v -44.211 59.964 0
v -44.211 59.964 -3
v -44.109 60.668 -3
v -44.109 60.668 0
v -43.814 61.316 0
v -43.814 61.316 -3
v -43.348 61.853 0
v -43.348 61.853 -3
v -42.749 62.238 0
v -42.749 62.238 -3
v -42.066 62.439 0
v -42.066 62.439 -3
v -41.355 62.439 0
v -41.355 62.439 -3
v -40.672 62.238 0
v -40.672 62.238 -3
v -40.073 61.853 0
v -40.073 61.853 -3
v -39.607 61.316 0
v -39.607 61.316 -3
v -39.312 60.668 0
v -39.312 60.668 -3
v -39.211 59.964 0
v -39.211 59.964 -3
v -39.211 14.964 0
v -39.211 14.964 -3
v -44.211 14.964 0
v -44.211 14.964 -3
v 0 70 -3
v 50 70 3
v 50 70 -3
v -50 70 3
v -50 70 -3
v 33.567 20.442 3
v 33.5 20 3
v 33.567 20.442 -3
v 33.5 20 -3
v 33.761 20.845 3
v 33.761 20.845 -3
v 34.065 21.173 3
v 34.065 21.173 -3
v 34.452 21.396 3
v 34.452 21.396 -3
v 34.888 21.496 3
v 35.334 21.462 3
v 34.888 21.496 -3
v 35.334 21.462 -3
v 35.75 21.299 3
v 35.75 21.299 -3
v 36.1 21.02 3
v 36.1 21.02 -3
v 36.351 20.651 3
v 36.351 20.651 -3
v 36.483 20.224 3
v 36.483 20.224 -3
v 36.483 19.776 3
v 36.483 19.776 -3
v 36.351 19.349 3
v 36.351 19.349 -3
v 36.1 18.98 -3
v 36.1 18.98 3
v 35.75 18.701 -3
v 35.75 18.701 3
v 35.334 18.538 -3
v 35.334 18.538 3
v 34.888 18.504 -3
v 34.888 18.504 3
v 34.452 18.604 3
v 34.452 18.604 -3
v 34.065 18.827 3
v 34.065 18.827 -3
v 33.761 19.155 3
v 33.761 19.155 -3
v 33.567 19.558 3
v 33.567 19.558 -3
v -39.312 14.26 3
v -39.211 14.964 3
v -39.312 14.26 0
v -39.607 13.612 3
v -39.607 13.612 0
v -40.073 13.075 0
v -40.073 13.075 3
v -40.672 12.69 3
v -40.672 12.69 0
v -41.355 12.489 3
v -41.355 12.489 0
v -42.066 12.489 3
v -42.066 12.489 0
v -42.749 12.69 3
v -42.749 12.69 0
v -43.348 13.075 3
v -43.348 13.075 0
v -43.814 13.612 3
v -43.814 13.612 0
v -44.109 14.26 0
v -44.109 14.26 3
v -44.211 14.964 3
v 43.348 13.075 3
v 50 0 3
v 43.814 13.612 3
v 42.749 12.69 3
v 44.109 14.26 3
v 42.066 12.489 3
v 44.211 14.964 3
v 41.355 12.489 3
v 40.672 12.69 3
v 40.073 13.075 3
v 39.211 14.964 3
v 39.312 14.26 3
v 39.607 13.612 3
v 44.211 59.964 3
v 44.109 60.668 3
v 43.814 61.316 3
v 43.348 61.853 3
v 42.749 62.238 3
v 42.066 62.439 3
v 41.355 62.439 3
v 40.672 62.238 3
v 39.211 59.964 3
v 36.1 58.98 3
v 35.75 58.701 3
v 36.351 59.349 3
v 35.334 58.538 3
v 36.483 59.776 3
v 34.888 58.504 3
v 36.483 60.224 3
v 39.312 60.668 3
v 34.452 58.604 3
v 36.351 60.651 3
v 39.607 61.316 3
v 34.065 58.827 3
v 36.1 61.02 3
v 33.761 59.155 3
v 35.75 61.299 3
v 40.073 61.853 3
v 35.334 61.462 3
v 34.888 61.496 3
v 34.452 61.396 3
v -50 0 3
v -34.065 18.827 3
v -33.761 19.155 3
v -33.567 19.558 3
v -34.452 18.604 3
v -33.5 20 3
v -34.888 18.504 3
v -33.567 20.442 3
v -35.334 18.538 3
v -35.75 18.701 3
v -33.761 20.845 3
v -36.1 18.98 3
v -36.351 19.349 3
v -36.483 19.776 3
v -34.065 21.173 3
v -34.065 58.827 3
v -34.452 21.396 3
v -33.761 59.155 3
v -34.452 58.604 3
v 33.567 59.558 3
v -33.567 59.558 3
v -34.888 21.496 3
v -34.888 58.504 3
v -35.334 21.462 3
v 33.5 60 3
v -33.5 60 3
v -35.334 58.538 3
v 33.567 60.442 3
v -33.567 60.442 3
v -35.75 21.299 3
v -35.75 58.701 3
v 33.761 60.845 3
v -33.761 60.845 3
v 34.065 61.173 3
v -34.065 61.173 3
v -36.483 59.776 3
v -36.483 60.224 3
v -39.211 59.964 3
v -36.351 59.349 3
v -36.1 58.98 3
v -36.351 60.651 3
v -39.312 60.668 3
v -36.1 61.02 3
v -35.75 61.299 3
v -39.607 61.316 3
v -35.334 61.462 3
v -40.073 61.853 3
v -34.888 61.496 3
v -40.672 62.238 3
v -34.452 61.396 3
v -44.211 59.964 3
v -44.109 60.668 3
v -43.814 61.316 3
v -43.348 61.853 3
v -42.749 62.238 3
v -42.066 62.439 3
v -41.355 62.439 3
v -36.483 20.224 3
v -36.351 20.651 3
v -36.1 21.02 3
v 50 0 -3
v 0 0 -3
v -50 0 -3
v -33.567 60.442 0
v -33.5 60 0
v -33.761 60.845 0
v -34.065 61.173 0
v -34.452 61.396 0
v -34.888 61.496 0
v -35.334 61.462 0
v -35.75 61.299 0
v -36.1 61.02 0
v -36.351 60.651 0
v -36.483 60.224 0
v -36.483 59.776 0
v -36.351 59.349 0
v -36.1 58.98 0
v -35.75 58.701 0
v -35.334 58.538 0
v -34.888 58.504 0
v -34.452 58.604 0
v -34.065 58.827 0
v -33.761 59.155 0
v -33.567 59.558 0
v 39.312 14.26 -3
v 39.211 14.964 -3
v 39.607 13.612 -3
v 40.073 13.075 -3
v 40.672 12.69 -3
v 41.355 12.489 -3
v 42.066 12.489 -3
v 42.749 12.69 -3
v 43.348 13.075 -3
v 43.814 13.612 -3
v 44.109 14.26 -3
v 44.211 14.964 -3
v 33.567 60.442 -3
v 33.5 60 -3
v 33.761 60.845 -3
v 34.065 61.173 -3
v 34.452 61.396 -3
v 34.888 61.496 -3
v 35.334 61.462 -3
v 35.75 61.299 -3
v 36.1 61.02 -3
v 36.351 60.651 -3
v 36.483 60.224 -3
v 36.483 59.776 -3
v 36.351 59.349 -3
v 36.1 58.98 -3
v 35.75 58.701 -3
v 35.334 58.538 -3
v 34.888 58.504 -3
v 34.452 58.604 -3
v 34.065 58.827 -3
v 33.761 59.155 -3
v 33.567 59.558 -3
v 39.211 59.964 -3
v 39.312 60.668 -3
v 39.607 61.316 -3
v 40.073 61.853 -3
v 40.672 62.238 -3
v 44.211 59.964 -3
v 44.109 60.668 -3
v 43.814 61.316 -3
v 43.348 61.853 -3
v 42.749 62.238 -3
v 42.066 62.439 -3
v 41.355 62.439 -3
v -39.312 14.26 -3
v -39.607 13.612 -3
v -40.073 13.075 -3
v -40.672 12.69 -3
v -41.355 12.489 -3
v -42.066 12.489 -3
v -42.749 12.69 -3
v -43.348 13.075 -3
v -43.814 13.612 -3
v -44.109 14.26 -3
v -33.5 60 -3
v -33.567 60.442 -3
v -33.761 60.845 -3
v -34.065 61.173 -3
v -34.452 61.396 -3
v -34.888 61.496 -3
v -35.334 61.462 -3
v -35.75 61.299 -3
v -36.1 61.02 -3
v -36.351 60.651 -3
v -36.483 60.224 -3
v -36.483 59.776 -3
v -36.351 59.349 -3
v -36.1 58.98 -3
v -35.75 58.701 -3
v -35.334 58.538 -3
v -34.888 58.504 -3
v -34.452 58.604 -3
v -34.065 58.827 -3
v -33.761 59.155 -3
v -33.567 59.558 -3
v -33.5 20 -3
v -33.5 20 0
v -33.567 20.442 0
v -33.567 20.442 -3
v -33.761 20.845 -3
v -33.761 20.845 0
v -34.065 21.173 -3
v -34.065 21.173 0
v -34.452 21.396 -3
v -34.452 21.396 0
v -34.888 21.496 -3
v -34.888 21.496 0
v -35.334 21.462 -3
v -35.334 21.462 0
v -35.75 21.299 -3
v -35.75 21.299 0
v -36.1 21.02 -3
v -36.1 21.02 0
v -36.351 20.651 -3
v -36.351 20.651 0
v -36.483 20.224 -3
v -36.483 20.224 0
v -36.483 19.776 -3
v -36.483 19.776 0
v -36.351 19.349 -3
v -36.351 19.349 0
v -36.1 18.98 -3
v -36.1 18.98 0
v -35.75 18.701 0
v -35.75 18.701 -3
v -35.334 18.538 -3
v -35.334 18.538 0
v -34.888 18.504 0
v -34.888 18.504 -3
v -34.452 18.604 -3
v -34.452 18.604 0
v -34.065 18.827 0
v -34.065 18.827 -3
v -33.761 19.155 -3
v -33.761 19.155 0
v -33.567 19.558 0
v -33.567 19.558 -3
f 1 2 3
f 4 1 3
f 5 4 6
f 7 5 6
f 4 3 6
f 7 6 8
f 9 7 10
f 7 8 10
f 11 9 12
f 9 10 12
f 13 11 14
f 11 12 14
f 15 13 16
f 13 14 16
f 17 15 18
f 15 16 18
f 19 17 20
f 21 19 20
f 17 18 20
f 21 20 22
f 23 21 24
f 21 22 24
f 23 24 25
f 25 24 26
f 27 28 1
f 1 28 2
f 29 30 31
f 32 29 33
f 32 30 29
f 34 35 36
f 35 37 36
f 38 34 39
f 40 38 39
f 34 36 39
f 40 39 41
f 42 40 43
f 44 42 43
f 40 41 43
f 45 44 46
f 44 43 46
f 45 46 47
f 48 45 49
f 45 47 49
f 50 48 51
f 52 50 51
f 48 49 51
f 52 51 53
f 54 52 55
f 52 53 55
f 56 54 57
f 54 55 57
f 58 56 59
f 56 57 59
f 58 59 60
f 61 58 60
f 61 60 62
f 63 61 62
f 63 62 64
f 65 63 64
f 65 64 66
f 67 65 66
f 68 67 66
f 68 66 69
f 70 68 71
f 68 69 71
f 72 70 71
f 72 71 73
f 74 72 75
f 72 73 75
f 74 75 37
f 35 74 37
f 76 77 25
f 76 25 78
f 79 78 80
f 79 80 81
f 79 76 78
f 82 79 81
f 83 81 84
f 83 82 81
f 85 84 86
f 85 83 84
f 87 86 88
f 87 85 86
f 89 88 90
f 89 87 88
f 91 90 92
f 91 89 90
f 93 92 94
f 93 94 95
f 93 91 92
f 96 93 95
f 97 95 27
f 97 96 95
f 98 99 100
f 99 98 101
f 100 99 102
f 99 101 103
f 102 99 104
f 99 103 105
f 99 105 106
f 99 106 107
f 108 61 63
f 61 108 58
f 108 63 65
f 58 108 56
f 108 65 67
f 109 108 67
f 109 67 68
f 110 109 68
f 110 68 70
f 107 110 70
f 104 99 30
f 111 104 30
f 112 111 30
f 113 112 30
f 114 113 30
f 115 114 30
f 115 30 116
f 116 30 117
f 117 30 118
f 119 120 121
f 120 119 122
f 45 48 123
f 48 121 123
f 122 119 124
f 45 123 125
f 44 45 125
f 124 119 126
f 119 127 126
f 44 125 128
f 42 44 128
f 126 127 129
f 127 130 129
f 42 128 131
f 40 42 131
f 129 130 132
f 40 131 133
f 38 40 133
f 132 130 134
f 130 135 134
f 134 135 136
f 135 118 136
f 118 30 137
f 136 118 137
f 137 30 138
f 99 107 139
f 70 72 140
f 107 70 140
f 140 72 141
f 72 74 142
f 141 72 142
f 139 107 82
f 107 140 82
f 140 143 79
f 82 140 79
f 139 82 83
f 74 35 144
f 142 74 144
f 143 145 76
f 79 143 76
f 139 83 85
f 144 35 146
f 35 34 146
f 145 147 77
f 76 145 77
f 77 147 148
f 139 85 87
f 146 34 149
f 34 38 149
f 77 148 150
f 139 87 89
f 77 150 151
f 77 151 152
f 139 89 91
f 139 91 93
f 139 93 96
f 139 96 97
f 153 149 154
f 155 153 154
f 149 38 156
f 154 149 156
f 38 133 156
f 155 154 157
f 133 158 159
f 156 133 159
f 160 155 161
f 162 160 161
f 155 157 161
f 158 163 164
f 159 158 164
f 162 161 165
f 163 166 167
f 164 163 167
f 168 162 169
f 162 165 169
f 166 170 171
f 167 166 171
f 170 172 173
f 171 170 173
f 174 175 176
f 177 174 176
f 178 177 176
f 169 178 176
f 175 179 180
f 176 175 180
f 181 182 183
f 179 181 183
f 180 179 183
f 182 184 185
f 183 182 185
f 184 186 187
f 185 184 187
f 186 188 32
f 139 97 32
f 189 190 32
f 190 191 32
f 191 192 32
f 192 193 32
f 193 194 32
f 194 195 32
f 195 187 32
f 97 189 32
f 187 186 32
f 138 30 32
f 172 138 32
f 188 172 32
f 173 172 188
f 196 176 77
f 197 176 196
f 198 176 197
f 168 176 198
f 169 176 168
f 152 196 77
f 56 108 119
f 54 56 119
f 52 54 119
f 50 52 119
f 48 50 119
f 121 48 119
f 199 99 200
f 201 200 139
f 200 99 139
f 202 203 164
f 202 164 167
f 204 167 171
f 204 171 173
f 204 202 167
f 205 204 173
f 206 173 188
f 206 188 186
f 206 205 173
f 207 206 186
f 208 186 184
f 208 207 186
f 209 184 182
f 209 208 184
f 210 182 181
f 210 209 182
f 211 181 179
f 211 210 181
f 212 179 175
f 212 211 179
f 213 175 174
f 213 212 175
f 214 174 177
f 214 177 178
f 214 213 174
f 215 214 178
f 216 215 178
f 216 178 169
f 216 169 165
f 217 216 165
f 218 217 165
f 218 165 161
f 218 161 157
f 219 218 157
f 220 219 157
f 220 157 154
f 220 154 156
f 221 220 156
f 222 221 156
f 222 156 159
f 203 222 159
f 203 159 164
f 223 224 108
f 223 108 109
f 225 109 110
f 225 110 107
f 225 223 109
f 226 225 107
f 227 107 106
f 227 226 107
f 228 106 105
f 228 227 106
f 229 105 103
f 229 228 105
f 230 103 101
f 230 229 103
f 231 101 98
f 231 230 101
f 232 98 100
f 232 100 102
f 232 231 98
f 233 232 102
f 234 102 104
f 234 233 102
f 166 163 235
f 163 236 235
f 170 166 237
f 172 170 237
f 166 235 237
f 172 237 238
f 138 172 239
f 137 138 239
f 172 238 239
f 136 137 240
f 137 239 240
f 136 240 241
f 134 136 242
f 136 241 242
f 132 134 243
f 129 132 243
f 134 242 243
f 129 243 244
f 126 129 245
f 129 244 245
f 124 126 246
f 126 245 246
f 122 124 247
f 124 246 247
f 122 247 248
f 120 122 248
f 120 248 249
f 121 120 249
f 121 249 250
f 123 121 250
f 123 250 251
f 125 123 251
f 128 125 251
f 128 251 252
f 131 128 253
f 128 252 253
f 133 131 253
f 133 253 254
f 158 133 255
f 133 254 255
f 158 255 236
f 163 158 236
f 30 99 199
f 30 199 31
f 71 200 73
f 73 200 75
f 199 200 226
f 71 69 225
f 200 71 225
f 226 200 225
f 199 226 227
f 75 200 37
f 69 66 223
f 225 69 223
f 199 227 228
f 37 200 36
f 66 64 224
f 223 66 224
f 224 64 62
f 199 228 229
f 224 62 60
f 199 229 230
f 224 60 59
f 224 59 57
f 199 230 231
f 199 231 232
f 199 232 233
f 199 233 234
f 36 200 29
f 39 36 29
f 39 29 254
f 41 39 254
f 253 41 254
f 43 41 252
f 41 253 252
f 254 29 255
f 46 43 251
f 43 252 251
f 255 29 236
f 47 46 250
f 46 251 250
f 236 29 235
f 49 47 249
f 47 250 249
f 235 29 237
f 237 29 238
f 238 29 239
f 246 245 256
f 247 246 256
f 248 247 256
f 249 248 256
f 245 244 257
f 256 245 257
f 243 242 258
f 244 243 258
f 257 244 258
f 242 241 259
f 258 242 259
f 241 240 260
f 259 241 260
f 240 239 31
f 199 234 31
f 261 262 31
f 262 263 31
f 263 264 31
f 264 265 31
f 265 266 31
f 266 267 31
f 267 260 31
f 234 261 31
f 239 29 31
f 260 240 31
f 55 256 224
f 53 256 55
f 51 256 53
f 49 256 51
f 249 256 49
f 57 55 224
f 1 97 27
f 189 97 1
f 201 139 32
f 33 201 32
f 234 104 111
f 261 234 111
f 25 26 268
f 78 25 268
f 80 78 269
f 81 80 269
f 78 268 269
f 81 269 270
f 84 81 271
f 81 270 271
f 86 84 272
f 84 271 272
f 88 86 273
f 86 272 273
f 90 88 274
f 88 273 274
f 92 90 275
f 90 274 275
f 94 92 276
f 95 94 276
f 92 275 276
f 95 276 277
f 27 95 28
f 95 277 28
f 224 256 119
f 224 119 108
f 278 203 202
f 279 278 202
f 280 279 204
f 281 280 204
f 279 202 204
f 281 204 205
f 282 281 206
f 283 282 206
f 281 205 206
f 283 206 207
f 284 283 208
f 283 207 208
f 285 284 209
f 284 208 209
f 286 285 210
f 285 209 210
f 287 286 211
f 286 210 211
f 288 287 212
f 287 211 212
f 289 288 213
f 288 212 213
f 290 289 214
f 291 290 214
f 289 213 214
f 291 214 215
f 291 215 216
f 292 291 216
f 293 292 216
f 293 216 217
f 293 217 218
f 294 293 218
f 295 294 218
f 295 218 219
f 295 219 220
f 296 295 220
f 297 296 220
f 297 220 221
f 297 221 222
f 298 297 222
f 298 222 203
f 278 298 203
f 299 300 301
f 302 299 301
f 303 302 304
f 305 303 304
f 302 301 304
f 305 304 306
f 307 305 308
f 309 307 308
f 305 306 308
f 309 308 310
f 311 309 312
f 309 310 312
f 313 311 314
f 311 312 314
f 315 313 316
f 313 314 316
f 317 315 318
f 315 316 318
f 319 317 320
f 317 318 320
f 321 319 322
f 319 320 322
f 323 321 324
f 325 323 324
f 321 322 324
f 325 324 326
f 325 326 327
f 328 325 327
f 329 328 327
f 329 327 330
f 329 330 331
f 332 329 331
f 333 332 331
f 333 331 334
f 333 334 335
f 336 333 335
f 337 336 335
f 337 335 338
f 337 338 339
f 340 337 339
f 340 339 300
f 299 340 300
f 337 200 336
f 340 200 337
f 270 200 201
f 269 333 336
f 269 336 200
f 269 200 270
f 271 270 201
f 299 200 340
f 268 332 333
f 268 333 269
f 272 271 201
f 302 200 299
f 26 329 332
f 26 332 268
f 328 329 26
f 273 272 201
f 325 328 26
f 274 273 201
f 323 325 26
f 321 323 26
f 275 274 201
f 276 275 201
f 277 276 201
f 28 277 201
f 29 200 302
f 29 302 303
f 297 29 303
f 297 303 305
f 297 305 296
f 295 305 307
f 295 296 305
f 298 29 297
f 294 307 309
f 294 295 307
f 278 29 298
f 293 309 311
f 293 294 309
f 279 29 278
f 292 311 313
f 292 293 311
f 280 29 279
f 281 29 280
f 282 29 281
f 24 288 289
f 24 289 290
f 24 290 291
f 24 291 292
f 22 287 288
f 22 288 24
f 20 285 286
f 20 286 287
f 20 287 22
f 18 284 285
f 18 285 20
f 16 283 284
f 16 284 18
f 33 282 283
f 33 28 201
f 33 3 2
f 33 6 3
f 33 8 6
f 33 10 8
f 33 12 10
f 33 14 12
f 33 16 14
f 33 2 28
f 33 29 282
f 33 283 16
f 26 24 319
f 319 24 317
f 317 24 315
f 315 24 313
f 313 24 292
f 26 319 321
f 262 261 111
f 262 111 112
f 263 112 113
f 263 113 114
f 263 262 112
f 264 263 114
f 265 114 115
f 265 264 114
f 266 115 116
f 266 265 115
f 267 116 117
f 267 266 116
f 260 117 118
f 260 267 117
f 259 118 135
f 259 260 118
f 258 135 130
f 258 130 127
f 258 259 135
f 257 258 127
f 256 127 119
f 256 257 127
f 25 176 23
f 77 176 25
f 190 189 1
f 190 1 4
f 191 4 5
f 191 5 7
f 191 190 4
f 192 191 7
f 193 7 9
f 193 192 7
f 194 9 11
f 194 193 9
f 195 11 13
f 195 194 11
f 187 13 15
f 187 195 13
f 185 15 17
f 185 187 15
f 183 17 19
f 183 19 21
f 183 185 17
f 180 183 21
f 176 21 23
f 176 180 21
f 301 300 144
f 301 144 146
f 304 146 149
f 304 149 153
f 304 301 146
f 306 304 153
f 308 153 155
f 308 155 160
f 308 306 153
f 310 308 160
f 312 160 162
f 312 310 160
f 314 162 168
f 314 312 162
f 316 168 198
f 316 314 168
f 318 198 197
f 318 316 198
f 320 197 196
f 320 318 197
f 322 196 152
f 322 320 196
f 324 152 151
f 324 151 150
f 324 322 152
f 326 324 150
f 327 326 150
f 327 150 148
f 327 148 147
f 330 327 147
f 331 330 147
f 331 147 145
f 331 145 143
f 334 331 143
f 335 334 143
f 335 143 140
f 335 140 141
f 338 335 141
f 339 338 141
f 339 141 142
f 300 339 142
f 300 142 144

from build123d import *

# Parameters (mm, degrees)
F0_W     = 50
F0_H     = 70
F1_DEPTH = 3
F3_D     = 3
F6_DEPTH = 33


with BuildPart() as f1:
    # F0 (on Top) → F1 (new body)
    with BuildSketch(Plane.XY):
        with Locations((25, 35)):
            Rectangle(F0_W, F0_H)
    extrude(amount=F1_DEPTH)

    # F3 (through all)
    with Locations(Plane.XY.offset(3)):
        with Locations((35, 20), (35, 60)):
            Hole(F3_D / 2)

    # F5 (on face) → F6 (cut)
    with BuildSketch(Plane.XY.offset(3)):
        with BuildLine():
            ThreePointArc((44.21057, 59.963956), (41.71057, 62.463956), (39.21057, 59.963956))
            Line((39.21057, 59.963956), (39.21057, 14.963956))
            ThreePointArc((39.21057, 14.963956), (41.71057, 12.463956), (44.21057, 14.963956))
            Line((44.21057, 14.963956), (44.21057, 59.963956))
        make_face()
    extrude(amount=-F6_DEPTH, mode=Mode.SUBTRACT)

    # F7: F1 across plane


with BuildPart() as f1_1:
    add(f1.part)
    add(f1.part.mirror(Plane.XY))

    # F8: F1 across plane


with BuildPart() as f1_2:
    add(f1_1.part)
    add(f1_1.part.mirror(Plane.YZ))


solid = f1_2.part
